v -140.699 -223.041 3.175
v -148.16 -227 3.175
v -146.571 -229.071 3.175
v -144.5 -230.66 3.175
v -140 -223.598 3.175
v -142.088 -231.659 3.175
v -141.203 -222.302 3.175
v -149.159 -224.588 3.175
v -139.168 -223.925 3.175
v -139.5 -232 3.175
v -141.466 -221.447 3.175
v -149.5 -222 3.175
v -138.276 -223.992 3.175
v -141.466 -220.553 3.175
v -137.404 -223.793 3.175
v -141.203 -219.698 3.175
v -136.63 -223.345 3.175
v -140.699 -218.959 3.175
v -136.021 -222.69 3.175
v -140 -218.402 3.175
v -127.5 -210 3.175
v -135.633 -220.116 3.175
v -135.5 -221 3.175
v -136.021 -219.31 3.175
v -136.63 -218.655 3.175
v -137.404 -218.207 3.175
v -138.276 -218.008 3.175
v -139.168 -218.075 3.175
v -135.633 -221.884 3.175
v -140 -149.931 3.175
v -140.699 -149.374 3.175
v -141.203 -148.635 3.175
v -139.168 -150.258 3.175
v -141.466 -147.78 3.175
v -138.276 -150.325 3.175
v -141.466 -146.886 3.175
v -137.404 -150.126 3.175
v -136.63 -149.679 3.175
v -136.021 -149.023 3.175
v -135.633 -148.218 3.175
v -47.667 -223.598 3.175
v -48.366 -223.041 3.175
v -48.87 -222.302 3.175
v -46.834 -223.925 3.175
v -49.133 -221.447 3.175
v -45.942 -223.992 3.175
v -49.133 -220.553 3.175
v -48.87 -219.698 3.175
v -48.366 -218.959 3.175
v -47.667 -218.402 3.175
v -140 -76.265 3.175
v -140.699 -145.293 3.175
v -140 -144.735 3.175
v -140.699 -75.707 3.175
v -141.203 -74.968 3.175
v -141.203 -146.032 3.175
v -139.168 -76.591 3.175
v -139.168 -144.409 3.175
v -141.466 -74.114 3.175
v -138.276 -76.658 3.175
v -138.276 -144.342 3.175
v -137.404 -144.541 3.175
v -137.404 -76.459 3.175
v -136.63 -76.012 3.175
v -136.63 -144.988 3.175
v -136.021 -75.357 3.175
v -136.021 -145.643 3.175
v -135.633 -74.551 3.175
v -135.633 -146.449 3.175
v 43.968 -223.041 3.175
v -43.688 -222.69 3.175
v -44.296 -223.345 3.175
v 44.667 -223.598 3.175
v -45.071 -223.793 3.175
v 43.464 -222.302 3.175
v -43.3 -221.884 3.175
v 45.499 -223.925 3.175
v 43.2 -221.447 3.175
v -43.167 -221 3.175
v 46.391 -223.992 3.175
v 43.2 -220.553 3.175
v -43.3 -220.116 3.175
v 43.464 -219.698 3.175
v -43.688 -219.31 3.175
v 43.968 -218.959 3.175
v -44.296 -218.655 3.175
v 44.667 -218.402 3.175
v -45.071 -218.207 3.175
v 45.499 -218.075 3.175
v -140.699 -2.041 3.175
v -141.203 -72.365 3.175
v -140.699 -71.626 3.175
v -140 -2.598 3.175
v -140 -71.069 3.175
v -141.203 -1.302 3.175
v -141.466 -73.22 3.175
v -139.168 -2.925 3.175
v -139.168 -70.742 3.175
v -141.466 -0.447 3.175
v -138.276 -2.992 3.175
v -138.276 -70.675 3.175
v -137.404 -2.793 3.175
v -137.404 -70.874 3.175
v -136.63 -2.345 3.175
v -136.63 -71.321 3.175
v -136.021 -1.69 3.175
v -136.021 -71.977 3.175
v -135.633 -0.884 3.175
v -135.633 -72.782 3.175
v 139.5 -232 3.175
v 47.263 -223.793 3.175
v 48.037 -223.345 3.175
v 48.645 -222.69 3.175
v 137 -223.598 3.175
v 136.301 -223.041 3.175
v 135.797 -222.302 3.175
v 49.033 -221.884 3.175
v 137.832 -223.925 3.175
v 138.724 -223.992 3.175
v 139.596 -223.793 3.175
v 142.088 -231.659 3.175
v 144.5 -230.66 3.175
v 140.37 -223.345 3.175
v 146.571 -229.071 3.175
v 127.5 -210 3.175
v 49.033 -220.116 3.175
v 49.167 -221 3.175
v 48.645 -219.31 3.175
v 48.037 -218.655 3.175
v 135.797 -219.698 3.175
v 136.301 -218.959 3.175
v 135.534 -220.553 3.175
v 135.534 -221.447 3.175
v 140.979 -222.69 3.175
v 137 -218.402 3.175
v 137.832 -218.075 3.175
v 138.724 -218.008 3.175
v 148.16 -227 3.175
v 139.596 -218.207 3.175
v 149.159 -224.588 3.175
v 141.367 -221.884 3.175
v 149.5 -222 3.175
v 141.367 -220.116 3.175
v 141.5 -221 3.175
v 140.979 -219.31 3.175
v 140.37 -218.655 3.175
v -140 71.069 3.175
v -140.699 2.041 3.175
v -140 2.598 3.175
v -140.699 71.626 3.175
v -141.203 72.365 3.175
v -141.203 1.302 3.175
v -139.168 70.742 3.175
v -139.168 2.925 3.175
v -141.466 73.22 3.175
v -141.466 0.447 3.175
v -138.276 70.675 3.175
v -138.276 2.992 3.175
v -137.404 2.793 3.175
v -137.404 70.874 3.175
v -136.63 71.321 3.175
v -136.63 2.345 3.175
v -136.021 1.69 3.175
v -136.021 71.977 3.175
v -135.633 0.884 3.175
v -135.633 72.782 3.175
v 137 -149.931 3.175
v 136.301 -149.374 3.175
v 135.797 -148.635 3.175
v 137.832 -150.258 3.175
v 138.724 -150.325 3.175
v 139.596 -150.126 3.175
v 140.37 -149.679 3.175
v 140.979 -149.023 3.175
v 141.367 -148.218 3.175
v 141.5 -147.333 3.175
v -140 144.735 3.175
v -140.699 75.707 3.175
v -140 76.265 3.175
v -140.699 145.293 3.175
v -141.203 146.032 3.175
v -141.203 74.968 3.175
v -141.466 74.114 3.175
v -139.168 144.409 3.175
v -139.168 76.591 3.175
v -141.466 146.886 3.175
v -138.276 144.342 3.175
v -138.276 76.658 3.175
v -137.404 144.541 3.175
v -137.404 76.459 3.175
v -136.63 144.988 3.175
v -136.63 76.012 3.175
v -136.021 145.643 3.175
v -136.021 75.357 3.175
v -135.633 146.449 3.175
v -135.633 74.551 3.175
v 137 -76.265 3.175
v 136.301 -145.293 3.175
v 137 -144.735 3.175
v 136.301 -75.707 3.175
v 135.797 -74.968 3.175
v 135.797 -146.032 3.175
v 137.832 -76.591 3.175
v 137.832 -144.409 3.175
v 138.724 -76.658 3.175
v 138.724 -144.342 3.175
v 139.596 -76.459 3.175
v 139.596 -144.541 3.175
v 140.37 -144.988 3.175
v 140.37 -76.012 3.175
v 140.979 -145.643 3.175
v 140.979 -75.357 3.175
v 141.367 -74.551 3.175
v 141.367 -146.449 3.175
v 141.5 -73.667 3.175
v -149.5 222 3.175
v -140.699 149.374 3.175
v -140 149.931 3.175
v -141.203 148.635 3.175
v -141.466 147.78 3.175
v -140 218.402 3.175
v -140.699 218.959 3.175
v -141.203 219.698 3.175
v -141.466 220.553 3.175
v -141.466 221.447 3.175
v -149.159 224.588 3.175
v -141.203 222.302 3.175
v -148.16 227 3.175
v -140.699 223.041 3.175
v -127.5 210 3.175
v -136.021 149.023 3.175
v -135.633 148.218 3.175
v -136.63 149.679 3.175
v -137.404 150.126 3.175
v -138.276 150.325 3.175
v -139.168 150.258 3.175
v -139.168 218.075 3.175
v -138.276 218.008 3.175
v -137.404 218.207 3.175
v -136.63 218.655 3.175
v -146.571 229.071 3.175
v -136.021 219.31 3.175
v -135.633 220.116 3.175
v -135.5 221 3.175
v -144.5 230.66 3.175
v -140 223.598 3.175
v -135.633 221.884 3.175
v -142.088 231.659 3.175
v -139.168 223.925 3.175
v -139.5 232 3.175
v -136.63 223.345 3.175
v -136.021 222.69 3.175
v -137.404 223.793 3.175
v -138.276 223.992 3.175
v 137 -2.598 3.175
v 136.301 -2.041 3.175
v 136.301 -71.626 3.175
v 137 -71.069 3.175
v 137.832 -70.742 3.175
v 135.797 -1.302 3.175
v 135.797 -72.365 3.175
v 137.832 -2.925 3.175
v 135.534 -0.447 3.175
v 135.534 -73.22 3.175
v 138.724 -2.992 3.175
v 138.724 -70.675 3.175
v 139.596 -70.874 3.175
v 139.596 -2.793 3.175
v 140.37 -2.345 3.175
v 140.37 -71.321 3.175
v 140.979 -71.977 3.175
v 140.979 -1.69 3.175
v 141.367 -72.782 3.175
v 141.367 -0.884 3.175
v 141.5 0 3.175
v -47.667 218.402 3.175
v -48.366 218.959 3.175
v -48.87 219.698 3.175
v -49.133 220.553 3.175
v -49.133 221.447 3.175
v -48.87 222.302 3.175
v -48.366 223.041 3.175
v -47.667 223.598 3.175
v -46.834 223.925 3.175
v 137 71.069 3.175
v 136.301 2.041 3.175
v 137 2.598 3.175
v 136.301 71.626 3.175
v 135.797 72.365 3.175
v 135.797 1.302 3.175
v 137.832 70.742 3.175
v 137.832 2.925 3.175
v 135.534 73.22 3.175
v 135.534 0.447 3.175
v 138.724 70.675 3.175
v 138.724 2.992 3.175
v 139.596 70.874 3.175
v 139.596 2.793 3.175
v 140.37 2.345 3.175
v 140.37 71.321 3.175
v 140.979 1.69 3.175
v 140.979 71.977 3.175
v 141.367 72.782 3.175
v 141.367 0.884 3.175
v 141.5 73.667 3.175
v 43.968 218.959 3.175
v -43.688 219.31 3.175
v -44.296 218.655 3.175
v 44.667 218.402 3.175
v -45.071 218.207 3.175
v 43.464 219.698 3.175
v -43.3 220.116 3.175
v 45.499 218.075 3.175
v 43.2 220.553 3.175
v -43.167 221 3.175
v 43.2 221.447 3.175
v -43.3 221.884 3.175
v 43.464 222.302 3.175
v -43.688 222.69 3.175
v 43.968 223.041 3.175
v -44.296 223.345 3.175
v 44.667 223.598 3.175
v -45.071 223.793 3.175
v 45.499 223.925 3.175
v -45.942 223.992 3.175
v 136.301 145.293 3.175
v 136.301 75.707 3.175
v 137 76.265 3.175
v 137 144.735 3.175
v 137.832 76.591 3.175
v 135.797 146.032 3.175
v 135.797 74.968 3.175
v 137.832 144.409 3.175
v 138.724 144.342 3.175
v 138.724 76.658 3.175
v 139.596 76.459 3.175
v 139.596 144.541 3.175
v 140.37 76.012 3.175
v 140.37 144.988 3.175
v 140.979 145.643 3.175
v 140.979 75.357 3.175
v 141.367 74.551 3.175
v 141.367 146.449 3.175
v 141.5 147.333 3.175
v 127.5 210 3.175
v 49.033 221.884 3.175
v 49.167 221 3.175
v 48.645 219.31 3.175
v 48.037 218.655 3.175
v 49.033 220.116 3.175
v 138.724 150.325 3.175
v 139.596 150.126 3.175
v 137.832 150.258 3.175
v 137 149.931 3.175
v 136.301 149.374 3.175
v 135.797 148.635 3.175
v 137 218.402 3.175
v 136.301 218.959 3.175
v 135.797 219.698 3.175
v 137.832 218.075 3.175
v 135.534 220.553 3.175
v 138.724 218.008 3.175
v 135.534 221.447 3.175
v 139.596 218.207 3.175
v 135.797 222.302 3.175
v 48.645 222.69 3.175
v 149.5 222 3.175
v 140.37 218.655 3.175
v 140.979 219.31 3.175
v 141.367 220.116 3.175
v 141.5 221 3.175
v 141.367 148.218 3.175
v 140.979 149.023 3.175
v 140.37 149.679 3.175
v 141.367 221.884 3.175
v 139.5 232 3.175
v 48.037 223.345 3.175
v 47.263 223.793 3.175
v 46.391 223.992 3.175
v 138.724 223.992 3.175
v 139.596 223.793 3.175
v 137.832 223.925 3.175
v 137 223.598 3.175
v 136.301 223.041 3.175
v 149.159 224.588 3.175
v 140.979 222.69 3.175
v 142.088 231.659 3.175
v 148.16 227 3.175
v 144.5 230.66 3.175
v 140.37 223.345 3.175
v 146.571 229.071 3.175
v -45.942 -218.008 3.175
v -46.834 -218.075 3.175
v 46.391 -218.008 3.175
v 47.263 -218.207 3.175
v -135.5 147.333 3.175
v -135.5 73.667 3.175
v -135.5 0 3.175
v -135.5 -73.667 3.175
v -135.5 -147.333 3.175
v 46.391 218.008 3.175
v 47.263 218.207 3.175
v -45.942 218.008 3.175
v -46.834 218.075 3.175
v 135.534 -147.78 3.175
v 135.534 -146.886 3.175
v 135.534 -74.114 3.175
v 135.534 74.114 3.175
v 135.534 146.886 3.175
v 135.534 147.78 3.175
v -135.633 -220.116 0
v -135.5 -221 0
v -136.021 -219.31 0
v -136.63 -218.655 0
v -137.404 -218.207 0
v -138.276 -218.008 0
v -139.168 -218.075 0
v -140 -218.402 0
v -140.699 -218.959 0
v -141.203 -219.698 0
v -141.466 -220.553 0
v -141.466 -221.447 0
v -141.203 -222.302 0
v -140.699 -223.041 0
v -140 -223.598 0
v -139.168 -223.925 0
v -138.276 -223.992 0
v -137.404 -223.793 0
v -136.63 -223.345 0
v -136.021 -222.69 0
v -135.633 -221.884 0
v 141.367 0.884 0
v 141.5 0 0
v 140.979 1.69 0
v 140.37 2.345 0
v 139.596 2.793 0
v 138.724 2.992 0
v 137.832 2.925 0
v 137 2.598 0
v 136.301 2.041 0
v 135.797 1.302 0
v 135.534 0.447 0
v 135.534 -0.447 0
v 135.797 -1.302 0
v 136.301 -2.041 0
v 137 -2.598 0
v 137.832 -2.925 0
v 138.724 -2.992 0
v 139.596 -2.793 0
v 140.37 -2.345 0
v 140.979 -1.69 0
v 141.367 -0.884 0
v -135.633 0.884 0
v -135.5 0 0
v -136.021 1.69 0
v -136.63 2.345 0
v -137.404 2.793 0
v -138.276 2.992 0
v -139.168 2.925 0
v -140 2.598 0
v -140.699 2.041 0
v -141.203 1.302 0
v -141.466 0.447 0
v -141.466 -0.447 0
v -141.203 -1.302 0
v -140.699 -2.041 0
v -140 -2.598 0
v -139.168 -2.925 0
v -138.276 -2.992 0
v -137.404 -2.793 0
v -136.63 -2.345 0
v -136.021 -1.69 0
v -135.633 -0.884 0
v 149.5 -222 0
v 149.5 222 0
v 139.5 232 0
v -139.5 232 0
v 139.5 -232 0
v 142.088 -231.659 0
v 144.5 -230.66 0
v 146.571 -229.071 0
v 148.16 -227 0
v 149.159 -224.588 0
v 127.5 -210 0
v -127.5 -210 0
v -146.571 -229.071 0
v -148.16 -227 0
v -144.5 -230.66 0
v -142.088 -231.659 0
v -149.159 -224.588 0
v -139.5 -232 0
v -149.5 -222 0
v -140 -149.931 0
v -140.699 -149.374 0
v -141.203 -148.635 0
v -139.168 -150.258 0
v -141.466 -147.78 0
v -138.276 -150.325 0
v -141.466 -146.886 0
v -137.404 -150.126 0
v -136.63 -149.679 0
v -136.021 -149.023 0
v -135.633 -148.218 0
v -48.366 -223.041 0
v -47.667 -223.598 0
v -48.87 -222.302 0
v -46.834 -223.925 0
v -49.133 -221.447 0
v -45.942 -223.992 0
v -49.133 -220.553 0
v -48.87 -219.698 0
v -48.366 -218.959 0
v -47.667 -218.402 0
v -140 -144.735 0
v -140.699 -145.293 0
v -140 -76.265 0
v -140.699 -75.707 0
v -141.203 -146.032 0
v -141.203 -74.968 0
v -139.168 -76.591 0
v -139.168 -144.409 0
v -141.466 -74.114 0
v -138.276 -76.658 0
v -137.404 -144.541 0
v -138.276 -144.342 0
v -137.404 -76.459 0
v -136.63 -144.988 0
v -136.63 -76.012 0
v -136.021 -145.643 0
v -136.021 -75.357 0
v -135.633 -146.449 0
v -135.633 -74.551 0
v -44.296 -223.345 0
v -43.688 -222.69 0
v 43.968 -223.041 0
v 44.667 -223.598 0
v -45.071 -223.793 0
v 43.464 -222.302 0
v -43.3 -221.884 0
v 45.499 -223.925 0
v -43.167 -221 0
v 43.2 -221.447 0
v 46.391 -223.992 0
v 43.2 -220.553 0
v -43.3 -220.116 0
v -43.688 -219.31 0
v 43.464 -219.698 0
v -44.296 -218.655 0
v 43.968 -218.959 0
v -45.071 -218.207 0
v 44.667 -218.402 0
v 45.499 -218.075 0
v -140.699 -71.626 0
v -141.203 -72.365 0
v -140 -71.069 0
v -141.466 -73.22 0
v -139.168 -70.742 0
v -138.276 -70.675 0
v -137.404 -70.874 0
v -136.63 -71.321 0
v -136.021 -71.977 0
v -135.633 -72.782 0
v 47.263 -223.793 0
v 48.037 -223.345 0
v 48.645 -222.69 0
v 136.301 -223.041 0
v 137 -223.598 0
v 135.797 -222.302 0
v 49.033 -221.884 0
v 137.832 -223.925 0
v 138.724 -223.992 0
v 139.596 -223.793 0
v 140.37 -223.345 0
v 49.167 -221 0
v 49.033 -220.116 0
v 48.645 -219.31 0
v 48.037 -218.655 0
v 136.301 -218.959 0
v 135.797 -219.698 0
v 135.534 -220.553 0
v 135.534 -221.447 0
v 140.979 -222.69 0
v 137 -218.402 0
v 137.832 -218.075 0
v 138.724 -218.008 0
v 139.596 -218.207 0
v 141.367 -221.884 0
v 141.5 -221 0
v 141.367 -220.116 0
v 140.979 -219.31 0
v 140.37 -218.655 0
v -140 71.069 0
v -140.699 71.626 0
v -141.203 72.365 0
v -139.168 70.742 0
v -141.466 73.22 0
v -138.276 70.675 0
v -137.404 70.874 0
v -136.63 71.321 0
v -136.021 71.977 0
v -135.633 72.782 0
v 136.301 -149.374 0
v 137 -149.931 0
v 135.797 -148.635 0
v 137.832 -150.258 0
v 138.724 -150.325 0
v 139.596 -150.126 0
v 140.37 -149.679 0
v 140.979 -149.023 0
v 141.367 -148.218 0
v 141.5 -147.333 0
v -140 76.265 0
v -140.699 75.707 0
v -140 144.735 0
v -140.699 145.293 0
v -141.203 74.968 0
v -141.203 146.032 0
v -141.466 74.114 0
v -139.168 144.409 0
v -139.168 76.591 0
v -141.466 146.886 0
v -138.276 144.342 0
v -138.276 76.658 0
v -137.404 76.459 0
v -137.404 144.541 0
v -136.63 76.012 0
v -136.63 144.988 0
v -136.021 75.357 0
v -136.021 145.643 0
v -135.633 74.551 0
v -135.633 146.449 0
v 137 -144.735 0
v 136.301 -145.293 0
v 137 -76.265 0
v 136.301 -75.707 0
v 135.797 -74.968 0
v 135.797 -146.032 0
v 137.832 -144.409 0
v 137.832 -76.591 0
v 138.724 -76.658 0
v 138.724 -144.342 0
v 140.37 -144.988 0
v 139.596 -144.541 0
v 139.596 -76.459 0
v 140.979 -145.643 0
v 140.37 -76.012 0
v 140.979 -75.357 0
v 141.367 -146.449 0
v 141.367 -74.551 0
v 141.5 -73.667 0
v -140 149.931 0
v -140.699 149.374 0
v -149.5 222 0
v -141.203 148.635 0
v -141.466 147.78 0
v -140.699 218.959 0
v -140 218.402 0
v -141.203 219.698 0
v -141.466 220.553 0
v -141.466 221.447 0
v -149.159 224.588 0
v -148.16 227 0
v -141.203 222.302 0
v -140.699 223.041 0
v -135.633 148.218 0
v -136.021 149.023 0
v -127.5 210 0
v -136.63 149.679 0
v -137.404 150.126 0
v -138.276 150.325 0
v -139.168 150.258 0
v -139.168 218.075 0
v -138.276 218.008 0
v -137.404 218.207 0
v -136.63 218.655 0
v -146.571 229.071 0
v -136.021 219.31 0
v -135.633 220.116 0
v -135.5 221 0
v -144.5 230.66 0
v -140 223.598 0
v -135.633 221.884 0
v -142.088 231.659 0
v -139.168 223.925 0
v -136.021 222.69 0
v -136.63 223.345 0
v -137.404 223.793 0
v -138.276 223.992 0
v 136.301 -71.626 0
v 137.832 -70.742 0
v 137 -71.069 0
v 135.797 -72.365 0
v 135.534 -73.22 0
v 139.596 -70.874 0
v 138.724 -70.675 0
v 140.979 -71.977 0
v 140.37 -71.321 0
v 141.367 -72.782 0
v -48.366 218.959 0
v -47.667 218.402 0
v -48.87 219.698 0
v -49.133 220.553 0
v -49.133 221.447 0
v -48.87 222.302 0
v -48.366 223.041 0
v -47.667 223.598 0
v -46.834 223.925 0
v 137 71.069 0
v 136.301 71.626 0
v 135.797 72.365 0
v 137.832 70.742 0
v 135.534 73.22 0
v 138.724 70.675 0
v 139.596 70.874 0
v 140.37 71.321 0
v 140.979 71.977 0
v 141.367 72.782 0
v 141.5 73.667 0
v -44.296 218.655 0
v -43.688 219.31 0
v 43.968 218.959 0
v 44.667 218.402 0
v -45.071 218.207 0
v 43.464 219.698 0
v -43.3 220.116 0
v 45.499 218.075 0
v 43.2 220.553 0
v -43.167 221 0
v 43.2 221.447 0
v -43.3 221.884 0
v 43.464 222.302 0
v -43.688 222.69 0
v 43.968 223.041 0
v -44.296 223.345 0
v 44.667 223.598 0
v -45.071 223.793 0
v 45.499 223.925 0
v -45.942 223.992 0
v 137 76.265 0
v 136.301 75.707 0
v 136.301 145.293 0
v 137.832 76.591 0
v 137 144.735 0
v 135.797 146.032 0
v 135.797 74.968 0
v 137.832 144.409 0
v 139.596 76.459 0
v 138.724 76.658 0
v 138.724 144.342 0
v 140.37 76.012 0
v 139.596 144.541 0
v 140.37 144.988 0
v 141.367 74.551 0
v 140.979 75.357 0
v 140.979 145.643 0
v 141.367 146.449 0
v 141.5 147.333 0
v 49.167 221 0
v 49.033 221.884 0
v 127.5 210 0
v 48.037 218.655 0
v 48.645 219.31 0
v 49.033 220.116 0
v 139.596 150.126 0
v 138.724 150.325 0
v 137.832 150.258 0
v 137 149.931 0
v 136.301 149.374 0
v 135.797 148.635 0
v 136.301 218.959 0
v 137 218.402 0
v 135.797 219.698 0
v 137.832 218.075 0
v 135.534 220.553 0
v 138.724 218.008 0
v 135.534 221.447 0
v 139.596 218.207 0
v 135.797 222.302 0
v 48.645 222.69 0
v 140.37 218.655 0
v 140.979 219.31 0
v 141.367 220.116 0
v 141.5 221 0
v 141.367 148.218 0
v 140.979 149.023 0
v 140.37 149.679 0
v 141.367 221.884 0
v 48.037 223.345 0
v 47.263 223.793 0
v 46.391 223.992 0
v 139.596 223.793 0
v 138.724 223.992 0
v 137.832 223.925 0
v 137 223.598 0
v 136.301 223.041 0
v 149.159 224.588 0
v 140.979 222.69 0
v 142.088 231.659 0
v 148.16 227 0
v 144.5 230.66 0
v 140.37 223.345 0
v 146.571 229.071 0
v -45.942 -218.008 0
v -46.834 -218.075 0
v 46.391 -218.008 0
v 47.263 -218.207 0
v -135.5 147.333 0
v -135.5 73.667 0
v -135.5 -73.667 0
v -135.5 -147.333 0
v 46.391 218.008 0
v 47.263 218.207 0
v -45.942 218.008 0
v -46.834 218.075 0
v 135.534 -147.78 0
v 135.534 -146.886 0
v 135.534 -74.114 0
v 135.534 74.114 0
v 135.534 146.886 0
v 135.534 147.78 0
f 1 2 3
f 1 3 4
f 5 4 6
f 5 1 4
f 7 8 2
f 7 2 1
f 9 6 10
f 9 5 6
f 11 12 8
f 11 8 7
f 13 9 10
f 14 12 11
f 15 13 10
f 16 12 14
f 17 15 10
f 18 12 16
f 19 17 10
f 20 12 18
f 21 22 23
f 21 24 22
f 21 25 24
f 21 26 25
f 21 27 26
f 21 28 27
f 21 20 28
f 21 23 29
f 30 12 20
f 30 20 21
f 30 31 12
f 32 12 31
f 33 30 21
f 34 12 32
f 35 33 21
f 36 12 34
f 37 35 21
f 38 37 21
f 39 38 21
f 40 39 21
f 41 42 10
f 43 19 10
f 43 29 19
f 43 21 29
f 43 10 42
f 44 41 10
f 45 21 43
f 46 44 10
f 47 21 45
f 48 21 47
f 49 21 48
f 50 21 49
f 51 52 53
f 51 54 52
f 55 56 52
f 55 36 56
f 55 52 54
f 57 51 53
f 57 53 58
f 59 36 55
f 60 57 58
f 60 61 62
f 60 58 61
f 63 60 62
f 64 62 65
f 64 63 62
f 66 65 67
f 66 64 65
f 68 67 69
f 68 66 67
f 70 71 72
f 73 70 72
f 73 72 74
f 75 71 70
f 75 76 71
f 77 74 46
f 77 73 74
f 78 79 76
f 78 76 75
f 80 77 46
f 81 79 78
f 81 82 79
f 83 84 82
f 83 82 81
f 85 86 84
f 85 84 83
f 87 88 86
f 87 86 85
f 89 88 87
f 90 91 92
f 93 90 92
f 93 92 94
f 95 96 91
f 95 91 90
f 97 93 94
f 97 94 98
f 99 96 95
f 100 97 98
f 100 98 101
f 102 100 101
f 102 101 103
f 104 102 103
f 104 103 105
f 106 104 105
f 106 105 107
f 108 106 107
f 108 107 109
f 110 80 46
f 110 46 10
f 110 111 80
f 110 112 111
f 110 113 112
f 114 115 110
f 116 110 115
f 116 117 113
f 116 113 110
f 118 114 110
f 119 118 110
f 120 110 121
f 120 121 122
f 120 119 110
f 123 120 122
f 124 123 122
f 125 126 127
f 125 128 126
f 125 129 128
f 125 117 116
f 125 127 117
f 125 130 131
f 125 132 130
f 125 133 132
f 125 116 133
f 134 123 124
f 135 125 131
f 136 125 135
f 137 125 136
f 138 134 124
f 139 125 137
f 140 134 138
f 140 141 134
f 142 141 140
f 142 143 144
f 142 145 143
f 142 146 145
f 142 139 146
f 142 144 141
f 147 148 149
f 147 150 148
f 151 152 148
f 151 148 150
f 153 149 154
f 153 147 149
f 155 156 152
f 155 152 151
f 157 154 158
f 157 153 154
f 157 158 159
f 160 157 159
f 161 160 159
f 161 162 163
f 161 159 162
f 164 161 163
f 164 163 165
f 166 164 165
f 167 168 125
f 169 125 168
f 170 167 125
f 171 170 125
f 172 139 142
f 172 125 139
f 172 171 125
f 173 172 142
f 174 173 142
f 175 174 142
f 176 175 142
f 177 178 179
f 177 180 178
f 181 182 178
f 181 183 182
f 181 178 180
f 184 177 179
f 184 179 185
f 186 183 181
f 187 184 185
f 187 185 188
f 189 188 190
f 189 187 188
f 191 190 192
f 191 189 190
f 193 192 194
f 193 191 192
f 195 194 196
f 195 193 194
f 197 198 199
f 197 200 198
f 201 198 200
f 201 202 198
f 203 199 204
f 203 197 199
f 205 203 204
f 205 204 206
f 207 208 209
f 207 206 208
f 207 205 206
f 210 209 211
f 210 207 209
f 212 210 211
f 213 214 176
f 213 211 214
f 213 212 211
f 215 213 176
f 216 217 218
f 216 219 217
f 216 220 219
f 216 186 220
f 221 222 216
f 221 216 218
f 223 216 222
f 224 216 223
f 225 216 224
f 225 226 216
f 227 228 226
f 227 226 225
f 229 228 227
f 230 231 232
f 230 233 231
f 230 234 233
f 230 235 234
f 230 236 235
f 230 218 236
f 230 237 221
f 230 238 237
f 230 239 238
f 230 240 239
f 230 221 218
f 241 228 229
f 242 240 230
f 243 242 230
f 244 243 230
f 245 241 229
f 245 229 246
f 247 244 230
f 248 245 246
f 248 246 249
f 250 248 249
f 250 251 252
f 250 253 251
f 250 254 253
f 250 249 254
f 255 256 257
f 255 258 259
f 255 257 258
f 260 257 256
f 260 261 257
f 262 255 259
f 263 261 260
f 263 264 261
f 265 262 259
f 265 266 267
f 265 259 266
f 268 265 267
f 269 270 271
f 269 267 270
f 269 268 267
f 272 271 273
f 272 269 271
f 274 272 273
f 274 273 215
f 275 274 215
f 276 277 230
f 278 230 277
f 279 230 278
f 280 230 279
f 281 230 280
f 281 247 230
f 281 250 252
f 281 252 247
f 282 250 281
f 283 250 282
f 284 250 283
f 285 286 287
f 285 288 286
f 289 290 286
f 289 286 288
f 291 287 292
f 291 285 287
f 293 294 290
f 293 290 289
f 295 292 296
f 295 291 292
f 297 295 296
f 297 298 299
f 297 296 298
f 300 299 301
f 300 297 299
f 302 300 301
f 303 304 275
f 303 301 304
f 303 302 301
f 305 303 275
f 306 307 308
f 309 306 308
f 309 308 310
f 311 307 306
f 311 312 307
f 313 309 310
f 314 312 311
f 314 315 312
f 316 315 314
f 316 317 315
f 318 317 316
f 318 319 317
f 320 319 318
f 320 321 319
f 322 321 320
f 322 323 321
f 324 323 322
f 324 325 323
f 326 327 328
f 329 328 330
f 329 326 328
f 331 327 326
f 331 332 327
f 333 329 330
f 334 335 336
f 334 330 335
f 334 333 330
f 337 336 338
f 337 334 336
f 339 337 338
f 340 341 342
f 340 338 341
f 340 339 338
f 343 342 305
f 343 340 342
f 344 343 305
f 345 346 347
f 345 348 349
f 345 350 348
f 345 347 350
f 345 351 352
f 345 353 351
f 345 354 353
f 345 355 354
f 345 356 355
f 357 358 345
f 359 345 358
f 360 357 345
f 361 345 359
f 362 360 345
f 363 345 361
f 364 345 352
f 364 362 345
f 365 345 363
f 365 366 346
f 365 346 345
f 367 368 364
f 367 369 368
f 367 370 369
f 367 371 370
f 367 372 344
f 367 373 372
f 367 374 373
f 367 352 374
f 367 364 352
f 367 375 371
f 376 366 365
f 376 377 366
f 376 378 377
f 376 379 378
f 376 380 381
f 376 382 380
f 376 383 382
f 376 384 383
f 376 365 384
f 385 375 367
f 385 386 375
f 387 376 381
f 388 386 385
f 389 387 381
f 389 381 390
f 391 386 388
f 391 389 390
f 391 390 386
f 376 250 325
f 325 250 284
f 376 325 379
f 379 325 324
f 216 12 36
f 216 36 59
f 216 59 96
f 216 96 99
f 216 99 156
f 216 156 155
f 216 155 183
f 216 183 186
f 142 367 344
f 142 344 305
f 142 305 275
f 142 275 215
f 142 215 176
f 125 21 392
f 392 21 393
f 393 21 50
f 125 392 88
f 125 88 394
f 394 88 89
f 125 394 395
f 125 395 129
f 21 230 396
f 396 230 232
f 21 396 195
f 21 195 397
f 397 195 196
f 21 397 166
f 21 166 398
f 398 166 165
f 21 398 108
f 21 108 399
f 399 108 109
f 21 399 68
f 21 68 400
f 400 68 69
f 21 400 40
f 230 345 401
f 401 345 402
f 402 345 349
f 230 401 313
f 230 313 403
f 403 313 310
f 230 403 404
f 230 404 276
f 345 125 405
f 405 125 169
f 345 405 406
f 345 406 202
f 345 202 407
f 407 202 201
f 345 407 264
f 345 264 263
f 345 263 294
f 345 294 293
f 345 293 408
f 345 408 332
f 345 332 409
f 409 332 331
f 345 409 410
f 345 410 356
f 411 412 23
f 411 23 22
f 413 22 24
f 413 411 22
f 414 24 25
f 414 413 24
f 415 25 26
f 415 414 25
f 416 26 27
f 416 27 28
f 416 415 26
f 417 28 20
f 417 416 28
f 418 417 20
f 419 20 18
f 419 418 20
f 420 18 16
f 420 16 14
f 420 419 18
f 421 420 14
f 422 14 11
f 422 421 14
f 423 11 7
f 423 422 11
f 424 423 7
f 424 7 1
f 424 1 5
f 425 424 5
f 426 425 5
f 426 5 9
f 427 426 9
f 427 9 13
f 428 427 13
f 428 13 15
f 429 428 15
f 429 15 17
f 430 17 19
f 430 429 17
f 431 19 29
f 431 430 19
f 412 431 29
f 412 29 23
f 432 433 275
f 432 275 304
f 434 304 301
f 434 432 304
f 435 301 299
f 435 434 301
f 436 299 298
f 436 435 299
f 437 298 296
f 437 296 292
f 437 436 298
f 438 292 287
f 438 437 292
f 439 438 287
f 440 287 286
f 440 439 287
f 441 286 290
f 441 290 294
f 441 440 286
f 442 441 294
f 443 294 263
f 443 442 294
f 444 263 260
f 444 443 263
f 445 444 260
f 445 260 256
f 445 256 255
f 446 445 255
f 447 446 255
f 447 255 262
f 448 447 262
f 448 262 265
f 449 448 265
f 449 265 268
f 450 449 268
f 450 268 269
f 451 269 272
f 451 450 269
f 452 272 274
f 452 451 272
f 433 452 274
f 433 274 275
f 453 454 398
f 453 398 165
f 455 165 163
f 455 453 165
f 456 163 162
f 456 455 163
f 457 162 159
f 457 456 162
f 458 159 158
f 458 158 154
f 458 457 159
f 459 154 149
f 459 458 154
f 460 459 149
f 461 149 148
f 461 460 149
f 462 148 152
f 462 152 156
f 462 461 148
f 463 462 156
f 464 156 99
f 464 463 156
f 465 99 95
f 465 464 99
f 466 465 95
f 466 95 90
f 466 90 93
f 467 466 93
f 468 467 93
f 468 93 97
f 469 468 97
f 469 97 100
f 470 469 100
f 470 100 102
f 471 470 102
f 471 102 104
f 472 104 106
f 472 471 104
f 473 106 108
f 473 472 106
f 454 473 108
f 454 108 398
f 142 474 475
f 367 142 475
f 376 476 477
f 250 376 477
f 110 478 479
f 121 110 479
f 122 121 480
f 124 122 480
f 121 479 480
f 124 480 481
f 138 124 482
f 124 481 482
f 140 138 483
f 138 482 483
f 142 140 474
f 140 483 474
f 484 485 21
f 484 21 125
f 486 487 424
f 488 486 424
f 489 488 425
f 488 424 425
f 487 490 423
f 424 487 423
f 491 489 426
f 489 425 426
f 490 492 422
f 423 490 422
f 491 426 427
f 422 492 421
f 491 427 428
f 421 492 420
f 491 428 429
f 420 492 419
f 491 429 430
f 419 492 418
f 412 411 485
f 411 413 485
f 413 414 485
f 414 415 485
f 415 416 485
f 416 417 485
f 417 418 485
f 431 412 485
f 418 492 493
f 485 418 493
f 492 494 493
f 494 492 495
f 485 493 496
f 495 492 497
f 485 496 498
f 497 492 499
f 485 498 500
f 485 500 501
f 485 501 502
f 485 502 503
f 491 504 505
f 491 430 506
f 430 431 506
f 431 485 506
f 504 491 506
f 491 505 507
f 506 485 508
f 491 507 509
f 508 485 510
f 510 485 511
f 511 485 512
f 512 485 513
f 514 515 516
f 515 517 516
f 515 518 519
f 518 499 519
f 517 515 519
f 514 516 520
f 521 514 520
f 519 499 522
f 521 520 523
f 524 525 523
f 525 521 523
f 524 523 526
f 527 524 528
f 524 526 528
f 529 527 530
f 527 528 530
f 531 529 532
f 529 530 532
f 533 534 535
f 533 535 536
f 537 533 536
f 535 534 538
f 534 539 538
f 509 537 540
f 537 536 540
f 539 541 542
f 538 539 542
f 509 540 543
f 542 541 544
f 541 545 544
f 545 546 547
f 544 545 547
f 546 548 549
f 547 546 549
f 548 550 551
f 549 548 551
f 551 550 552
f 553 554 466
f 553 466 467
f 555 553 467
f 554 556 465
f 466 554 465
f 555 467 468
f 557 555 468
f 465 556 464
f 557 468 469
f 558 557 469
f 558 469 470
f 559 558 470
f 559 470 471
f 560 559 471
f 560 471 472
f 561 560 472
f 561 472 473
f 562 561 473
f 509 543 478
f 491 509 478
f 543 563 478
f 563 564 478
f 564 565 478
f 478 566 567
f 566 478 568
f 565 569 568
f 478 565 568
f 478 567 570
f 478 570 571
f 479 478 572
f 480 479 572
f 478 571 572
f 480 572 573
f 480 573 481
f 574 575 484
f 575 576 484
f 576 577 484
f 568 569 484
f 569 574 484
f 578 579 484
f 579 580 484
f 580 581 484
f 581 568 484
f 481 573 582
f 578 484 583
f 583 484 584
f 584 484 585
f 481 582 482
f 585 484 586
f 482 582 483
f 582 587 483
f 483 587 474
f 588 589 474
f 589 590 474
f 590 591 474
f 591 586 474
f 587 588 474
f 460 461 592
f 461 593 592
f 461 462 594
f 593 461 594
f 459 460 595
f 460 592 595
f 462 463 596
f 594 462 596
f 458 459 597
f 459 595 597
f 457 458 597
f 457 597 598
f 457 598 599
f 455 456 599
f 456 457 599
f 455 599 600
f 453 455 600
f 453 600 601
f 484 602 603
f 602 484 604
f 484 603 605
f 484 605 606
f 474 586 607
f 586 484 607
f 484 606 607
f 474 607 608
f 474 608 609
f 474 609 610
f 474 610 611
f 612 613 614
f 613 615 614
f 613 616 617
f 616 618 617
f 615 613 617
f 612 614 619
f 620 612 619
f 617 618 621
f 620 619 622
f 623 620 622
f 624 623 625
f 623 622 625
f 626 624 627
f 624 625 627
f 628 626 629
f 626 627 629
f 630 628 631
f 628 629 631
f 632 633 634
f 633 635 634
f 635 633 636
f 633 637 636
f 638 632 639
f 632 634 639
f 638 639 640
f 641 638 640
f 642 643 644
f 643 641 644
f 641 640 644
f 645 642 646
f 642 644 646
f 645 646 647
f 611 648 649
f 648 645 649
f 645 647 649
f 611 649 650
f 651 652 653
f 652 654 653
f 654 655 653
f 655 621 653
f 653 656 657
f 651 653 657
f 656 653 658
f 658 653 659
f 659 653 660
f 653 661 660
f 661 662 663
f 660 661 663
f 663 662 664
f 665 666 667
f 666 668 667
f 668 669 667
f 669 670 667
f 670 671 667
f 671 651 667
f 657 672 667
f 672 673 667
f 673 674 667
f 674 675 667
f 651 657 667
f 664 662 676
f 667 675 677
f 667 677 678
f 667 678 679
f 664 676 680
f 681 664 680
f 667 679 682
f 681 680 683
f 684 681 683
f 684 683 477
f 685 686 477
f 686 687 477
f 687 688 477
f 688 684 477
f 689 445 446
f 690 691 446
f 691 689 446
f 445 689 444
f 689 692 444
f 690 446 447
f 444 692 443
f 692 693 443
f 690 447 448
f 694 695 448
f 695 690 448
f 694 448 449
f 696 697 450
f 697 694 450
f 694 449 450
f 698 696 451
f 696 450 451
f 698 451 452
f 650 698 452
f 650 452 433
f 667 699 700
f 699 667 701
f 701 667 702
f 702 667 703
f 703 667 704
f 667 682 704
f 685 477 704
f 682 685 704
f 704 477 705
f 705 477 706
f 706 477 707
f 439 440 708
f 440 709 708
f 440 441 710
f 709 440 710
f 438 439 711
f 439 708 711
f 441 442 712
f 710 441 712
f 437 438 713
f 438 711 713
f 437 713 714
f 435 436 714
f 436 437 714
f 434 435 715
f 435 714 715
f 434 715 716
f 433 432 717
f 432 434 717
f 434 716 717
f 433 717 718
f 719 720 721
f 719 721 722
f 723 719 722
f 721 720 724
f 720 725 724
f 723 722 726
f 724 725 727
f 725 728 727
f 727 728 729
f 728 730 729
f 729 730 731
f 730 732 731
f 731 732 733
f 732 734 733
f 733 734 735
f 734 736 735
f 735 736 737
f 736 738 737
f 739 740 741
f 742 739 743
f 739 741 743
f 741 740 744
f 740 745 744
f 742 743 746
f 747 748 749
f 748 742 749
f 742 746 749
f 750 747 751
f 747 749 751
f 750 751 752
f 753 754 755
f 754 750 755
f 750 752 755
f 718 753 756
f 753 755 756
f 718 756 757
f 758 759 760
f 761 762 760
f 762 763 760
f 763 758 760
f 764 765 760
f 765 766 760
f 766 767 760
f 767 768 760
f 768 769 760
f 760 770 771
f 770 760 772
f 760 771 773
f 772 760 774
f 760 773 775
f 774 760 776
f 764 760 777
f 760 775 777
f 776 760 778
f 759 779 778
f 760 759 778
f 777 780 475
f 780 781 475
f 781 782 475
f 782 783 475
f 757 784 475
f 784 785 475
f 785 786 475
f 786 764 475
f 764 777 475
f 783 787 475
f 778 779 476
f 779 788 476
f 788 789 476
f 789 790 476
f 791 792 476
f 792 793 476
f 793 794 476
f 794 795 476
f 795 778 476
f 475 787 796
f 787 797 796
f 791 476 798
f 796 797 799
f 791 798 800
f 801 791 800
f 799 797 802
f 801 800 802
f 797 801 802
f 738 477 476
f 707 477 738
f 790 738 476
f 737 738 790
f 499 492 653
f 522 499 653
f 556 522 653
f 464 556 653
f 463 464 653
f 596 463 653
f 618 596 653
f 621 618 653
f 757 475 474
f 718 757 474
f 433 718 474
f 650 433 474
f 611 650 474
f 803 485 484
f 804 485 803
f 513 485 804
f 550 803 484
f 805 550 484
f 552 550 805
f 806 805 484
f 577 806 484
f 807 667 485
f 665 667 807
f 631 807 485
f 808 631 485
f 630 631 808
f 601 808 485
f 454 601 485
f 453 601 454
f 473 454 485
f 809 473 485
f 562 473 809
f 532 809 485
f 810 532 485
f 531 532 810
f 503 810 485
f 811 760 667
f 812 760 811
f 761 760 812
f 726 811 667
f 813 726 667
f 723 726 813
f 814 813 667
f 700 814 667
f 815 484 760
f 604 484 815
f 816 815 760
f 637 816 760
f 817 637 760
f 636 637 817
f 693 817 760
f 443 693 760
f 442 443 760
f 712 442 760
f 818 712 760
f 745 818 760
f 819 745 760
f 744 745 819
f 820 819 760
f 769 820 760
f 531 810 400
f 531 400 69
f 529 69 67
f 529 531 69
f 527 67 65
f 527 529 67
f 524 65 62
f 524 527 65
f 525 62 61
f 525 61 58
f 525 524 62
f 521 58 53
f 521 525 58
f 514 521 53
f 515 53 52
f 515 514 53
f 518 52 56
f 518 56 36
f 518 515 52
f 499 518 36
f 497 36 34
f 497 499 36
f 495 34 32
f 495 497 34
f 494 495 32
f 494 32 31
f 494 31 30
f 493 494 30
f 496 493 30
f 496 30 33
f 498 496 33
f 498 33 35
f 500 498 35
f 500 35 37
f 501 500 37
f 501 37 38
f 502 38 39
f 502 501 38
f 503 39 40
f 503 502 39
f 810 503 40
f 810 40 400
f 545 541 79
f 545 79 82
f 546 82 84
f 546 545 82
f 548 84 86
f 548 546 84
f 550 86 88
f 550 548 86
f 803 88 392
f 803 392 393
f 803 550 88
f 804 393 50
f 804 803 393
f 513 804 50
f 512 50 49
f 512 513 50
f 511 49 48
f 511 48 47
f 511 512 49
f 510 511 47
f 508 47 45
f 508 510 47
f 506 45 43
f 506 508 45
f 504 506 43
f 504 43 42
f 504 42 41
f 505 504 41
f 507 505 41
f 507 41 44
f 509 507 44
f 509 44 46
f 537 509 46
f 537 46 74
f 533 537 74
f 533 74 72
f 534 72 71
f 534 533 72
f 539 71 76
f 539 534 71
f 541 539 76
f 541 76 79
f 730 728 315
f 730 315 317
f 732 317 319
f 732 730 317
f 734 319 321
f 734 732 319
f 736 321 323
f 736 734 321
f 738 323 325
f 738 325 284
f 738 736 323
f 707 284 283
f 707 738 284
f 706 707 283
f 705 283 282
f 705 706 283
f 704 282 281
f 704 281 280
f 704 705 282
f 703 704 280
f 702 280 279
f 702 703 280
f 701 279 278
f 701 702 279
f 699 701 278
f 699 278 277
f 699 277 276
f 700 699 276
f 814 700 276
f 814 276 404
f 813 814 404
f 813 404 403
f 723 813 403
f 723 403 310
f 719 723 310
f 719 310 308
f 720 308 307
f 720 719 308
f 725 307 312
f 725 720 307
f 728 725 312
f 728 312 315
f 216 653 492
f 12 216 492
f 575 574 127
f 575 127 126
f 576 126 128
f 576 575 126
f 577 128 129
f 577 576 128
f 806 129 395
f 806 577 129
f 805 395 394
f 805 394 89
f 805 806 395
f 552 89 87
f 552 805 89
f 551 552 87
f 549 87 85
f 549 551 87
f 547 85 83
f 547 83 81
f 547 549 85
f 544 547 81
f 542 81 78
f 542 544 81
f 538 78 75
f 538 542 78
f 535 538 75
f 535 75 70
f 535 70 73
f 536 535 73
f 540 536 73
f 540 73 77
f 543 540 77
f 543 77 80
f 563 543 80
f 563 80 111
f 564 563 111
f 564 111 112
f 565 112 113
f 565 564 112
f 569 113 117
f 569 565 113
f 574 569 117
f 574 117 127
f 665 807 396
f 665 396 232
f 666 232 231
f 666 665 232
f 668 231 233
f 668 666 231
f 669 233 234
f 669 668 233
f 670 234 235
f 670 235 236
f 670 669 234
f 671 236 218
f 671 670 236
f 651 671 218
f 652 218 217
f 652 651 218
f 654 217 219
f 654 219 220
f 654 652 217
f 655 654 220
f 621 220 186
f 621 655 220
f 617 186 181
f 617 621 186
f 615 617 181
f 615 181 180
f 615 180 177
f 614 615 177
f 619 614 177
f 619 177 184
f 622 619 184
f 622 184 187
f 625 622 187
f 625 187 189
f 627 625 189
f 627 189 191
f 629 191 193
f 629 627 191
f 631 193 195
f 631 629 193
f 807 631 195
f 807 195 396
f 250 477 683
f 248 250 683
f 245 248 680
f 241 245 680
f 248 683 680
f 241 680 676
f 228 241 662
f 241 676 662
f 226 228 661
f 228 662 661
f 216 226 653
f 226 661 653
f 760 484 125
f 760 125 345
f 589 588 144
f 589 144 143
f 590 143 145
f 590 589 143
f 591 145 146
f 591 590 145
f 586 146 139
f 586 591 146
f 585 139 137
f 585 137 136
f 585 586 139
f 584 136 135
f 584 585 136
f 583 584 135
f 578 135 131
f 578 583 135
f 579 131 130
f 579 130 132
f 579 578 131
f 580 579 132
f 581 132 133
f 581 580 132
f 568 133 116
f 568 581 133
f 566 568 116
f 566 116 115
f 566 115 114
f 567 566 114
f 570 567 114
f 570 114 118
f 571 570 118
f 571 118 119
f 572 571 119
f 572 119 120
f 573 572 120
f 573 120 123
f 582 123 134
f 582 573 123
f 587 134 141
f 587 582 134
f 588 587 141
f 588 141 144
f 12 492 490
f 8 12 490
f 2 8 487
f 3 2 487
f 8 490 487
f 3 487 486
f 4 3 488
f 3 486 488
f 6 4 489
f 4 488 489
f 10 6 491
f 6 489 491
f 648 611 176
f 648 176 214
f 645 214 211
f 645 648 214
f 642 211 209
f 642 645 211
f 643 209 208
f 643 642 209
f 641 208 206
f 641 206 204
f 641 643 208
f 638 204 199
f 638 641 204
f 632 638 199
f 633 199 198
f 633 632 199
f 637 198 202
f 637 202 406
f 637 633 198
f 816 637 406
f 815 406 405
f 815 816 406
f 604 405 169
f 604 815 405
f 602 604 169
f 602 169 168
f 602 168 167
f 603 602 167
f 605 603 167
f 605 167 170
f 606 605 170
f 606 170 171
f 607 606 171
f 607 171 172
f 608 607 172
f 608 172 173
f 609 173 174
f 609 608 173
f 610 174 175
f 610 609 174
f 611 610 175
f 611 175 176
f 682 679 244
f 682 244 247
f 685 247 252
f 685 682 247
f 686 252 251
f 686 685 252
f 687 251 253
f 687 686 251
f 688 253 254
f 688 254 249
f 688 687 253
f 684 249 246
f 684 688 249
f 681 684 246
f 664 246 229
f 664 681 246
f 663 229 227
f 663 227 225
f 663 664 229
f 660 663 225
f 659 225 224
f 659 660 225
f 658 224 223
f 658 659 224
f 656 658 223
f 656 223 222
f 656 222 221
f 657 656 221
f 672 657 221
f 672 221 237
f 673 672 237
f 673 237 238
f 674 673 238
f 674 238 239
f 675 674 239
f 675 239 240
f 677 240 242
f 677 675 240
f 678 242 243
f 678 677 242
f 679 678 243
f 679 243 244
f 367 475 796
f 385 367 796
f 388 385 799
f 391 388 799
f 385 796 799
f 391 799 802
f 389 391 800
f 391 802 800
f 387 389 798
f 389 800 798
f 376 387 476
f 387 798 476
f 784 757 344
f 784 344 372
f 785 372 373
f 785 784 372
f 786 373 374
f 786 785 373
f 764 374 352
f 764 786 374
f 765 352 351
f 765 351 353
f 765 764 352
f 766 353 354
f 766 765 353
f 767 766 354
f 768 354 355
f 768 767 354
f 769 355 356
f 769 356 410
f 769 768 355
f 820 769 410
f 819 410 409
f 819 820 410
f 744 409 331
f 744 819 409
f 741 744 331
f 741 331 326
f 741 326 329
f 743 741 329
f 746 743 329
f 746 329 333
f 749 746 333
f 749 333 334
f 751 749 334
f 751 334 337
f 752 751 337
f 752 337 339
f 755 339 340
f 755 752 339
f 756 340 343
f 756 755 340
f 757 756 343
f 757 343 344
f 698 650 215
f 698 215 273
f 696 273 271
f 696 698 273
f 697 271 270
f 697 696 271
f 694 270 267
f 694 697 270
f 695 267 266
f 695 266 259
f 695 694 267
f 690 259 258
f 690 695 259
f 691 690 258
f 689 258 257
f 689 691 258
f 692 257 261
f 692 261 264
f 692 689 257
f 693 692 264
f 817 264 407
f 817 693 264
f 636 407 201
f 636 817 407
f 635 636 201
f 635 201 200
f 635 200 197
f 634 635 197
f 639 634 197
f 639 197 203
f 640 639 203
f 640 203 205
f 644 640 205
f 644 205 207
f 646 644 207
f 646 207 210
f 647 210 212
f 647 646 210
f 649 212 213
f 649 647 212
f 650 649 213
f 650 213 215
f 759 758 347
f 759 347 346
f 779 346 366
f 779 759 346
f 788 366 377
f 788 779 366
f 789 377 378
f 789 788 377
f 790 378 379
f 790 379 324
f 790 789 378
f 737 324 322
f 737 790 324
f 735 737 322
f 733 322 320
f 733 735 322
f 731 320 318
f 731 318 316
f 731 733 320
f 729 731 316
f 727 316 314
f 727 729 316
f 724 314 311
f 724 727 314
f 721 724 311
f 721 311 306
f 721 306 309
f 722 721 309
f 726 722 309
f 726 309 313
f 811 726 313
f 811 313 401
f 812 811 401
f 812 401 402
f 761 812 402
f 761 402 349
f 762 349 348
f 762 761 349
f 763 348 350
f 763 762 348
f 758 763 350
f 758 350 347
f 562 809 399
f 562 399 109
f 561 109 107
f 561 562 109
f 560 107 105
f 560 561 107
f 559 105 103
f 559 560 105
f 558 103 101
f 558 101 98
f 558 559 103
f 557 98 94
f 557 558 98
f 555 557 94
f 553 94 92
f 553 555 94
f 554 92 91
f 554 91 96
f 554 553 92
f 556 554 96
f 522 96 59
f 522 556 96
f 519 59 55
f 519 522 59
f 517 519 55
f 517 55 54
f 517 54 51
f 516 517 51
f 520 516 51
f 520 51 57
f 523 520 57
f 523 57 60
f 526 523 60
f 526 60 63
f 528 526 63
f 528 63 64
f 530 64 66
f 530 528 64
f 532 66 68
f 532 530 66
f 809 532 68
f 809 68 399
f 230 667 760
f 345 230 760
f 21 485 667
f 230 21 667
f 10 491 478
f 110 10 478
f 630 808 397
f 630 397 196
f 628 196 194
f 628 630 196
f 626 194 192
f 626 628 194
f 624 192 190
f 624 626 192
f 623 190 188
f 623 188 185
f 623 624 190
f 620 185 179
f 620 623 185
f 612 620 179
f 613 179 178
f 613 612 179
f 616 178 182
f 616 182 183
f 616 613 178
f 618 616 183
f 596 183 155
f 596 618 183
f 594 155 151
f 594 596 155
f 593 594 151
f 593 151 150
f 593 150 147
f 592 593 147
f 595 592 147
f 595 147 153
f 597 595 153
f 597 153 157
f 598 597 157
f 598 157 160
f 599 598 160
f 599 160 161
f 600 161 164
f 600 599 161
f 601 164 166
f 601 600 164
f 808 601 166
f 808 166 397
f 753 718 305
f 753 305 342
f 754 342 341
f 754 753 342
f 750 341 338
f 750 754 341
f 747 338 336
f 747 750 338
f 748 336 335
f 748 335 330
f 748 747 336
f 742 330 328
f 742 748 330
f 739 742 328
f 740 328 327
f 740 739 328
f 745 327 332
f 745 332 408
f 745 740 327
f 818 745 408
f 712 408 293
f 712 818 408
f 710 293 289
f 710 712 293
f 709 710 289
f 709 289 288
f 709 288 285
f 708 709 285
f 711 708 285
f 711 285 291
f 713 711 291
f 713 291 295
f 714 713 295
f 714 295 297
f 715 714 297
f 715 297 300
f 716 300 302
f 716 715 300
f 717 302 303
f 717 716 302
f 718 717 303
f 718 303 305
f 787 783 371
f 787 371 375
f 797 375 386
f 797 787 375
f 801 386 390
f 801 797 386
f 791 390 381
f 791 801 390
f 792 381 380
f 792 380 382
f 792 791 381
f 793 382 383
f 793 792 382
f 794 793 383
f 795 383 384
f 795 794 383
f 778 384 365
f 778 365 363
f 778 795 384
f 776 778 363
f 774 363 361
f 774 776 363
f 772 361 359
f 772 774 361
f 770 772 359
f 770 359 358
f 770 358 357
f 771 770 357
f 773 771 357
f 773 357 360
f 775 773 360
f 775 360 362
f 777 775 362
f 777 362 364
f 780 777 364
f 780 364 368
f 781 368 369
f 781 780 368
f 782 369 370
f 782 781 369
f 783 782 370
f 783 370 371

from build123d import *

# Parameters (mm, degrees)
SKETCH1_R           = 3
SKETCH1_W           = 255
SKETCH1_H           = 420
BOSS_EXTRUDE1_DEPTH = 3.175


with BuildPart() as part:
    # Sketch1 → Boss-Extrude1 (new body)
    with BuildSketch(Plane.XY):
        with BuildLine():
            Line((139.5, 232), (-139.5, 232))
            ThreePointArc((-139.5, 232), (-146.571067812, 229.071067812), (-149.5, 222))
            Line((-149.5, 222), (-149.5, -222))
            ThreePointArc((-149.5, -222), (-146.571067812, -229.071067812), (-139.5, -232))
            Line((-139.5, -232), (139.5, -232))
            ThreePointArc((139.5, -232), (146.571067812, -229.071067812), (149.5, -222))
            Line((149.5, -222), (149.5, 222))
            ThreePointArc((149.5, 222), (146.571067812, 229.071067812), (139.5, 232))
        make_face()
        with Locations((138.5, -221)):
            Circle(SKETCH1_R, mode=Mode.SUBTRACT)
        with Locations((46.166666667, -221)):
            Circle(SKETCH1_R, mode=Mode.SUBTRACT)
        with Locations((-46.166666667, -221)):
            Circle(SKETCH1_R, mode=Mode.SUBTRACT)
        with Locations((-138.5, -221)):
            Circle(SKETCH1_R, mode=Mode.SUBTRACT)
        with Locations((-138.5, -73.666666667)):
            Circle(SKETCH1_R, mode=Mode.SUBTRACT)
        with Locations((-138.5, 0)):
            Circle(SKETCH1_R, mode=Mode.SUBTRACT)
        with Locations((138.5, -73.666666667)):
            Circle(SKETCH1_R, mode=Mode.SUBTRACT)
        with Locations((138.5, 0)):
            Circle(SKETCH1_R, mode=Mode.SUBTRACT)
        with Locations((138.5, 73.666666667)):
            Circle(SKETCH1_R, mode=Mode.SUBTRACT)
        with Locations((138.5, 147.333333333)):
            Circle(SKETCH1_R, mode=Mode.SUBTRACT)
        with Locations((138.5, 221)):
            Circle(SKETCH1_R, mode=Mode.SUBTRACT)
        with Locations((46.166666667, 221)):
            Circle(SKETCH1_R, mode=Mode.SUBTRACT)
        with Locations((-138.5, 73.666666667)):
            Circle(SKETCH1_R, mode=Mode.SUBTRACT)
        with Locations((-138.5, 147.333333333)):
            Circle(SKETCH1_R, mode=Mode.SUBTRACT)
        with Locations((-46.166666667, 221)):
            Circle(SKETCH1_R, mode=Mode.SUBTRACT)
        with Locations((-138.5, 221)):
            Circle(SKETCH1_R, mode=Mode.SUBTRACT)
        with Locations((138.5, -147.333333333)):
            Circle(SKETCH1_R, mode=Mode.SUBTRACT)
        with Locations((-138.5, -147.333333333)):
            Circle(SKETCH1_R, mode=Mode.SUBTRACT)
        Rectangle(SKETCH1_W, SKETCH1_H, mode=Mode.SUBTRACT)
    extrude(amount=BOSS_EXTRUDE1_DEPTH)


solid = part.part
